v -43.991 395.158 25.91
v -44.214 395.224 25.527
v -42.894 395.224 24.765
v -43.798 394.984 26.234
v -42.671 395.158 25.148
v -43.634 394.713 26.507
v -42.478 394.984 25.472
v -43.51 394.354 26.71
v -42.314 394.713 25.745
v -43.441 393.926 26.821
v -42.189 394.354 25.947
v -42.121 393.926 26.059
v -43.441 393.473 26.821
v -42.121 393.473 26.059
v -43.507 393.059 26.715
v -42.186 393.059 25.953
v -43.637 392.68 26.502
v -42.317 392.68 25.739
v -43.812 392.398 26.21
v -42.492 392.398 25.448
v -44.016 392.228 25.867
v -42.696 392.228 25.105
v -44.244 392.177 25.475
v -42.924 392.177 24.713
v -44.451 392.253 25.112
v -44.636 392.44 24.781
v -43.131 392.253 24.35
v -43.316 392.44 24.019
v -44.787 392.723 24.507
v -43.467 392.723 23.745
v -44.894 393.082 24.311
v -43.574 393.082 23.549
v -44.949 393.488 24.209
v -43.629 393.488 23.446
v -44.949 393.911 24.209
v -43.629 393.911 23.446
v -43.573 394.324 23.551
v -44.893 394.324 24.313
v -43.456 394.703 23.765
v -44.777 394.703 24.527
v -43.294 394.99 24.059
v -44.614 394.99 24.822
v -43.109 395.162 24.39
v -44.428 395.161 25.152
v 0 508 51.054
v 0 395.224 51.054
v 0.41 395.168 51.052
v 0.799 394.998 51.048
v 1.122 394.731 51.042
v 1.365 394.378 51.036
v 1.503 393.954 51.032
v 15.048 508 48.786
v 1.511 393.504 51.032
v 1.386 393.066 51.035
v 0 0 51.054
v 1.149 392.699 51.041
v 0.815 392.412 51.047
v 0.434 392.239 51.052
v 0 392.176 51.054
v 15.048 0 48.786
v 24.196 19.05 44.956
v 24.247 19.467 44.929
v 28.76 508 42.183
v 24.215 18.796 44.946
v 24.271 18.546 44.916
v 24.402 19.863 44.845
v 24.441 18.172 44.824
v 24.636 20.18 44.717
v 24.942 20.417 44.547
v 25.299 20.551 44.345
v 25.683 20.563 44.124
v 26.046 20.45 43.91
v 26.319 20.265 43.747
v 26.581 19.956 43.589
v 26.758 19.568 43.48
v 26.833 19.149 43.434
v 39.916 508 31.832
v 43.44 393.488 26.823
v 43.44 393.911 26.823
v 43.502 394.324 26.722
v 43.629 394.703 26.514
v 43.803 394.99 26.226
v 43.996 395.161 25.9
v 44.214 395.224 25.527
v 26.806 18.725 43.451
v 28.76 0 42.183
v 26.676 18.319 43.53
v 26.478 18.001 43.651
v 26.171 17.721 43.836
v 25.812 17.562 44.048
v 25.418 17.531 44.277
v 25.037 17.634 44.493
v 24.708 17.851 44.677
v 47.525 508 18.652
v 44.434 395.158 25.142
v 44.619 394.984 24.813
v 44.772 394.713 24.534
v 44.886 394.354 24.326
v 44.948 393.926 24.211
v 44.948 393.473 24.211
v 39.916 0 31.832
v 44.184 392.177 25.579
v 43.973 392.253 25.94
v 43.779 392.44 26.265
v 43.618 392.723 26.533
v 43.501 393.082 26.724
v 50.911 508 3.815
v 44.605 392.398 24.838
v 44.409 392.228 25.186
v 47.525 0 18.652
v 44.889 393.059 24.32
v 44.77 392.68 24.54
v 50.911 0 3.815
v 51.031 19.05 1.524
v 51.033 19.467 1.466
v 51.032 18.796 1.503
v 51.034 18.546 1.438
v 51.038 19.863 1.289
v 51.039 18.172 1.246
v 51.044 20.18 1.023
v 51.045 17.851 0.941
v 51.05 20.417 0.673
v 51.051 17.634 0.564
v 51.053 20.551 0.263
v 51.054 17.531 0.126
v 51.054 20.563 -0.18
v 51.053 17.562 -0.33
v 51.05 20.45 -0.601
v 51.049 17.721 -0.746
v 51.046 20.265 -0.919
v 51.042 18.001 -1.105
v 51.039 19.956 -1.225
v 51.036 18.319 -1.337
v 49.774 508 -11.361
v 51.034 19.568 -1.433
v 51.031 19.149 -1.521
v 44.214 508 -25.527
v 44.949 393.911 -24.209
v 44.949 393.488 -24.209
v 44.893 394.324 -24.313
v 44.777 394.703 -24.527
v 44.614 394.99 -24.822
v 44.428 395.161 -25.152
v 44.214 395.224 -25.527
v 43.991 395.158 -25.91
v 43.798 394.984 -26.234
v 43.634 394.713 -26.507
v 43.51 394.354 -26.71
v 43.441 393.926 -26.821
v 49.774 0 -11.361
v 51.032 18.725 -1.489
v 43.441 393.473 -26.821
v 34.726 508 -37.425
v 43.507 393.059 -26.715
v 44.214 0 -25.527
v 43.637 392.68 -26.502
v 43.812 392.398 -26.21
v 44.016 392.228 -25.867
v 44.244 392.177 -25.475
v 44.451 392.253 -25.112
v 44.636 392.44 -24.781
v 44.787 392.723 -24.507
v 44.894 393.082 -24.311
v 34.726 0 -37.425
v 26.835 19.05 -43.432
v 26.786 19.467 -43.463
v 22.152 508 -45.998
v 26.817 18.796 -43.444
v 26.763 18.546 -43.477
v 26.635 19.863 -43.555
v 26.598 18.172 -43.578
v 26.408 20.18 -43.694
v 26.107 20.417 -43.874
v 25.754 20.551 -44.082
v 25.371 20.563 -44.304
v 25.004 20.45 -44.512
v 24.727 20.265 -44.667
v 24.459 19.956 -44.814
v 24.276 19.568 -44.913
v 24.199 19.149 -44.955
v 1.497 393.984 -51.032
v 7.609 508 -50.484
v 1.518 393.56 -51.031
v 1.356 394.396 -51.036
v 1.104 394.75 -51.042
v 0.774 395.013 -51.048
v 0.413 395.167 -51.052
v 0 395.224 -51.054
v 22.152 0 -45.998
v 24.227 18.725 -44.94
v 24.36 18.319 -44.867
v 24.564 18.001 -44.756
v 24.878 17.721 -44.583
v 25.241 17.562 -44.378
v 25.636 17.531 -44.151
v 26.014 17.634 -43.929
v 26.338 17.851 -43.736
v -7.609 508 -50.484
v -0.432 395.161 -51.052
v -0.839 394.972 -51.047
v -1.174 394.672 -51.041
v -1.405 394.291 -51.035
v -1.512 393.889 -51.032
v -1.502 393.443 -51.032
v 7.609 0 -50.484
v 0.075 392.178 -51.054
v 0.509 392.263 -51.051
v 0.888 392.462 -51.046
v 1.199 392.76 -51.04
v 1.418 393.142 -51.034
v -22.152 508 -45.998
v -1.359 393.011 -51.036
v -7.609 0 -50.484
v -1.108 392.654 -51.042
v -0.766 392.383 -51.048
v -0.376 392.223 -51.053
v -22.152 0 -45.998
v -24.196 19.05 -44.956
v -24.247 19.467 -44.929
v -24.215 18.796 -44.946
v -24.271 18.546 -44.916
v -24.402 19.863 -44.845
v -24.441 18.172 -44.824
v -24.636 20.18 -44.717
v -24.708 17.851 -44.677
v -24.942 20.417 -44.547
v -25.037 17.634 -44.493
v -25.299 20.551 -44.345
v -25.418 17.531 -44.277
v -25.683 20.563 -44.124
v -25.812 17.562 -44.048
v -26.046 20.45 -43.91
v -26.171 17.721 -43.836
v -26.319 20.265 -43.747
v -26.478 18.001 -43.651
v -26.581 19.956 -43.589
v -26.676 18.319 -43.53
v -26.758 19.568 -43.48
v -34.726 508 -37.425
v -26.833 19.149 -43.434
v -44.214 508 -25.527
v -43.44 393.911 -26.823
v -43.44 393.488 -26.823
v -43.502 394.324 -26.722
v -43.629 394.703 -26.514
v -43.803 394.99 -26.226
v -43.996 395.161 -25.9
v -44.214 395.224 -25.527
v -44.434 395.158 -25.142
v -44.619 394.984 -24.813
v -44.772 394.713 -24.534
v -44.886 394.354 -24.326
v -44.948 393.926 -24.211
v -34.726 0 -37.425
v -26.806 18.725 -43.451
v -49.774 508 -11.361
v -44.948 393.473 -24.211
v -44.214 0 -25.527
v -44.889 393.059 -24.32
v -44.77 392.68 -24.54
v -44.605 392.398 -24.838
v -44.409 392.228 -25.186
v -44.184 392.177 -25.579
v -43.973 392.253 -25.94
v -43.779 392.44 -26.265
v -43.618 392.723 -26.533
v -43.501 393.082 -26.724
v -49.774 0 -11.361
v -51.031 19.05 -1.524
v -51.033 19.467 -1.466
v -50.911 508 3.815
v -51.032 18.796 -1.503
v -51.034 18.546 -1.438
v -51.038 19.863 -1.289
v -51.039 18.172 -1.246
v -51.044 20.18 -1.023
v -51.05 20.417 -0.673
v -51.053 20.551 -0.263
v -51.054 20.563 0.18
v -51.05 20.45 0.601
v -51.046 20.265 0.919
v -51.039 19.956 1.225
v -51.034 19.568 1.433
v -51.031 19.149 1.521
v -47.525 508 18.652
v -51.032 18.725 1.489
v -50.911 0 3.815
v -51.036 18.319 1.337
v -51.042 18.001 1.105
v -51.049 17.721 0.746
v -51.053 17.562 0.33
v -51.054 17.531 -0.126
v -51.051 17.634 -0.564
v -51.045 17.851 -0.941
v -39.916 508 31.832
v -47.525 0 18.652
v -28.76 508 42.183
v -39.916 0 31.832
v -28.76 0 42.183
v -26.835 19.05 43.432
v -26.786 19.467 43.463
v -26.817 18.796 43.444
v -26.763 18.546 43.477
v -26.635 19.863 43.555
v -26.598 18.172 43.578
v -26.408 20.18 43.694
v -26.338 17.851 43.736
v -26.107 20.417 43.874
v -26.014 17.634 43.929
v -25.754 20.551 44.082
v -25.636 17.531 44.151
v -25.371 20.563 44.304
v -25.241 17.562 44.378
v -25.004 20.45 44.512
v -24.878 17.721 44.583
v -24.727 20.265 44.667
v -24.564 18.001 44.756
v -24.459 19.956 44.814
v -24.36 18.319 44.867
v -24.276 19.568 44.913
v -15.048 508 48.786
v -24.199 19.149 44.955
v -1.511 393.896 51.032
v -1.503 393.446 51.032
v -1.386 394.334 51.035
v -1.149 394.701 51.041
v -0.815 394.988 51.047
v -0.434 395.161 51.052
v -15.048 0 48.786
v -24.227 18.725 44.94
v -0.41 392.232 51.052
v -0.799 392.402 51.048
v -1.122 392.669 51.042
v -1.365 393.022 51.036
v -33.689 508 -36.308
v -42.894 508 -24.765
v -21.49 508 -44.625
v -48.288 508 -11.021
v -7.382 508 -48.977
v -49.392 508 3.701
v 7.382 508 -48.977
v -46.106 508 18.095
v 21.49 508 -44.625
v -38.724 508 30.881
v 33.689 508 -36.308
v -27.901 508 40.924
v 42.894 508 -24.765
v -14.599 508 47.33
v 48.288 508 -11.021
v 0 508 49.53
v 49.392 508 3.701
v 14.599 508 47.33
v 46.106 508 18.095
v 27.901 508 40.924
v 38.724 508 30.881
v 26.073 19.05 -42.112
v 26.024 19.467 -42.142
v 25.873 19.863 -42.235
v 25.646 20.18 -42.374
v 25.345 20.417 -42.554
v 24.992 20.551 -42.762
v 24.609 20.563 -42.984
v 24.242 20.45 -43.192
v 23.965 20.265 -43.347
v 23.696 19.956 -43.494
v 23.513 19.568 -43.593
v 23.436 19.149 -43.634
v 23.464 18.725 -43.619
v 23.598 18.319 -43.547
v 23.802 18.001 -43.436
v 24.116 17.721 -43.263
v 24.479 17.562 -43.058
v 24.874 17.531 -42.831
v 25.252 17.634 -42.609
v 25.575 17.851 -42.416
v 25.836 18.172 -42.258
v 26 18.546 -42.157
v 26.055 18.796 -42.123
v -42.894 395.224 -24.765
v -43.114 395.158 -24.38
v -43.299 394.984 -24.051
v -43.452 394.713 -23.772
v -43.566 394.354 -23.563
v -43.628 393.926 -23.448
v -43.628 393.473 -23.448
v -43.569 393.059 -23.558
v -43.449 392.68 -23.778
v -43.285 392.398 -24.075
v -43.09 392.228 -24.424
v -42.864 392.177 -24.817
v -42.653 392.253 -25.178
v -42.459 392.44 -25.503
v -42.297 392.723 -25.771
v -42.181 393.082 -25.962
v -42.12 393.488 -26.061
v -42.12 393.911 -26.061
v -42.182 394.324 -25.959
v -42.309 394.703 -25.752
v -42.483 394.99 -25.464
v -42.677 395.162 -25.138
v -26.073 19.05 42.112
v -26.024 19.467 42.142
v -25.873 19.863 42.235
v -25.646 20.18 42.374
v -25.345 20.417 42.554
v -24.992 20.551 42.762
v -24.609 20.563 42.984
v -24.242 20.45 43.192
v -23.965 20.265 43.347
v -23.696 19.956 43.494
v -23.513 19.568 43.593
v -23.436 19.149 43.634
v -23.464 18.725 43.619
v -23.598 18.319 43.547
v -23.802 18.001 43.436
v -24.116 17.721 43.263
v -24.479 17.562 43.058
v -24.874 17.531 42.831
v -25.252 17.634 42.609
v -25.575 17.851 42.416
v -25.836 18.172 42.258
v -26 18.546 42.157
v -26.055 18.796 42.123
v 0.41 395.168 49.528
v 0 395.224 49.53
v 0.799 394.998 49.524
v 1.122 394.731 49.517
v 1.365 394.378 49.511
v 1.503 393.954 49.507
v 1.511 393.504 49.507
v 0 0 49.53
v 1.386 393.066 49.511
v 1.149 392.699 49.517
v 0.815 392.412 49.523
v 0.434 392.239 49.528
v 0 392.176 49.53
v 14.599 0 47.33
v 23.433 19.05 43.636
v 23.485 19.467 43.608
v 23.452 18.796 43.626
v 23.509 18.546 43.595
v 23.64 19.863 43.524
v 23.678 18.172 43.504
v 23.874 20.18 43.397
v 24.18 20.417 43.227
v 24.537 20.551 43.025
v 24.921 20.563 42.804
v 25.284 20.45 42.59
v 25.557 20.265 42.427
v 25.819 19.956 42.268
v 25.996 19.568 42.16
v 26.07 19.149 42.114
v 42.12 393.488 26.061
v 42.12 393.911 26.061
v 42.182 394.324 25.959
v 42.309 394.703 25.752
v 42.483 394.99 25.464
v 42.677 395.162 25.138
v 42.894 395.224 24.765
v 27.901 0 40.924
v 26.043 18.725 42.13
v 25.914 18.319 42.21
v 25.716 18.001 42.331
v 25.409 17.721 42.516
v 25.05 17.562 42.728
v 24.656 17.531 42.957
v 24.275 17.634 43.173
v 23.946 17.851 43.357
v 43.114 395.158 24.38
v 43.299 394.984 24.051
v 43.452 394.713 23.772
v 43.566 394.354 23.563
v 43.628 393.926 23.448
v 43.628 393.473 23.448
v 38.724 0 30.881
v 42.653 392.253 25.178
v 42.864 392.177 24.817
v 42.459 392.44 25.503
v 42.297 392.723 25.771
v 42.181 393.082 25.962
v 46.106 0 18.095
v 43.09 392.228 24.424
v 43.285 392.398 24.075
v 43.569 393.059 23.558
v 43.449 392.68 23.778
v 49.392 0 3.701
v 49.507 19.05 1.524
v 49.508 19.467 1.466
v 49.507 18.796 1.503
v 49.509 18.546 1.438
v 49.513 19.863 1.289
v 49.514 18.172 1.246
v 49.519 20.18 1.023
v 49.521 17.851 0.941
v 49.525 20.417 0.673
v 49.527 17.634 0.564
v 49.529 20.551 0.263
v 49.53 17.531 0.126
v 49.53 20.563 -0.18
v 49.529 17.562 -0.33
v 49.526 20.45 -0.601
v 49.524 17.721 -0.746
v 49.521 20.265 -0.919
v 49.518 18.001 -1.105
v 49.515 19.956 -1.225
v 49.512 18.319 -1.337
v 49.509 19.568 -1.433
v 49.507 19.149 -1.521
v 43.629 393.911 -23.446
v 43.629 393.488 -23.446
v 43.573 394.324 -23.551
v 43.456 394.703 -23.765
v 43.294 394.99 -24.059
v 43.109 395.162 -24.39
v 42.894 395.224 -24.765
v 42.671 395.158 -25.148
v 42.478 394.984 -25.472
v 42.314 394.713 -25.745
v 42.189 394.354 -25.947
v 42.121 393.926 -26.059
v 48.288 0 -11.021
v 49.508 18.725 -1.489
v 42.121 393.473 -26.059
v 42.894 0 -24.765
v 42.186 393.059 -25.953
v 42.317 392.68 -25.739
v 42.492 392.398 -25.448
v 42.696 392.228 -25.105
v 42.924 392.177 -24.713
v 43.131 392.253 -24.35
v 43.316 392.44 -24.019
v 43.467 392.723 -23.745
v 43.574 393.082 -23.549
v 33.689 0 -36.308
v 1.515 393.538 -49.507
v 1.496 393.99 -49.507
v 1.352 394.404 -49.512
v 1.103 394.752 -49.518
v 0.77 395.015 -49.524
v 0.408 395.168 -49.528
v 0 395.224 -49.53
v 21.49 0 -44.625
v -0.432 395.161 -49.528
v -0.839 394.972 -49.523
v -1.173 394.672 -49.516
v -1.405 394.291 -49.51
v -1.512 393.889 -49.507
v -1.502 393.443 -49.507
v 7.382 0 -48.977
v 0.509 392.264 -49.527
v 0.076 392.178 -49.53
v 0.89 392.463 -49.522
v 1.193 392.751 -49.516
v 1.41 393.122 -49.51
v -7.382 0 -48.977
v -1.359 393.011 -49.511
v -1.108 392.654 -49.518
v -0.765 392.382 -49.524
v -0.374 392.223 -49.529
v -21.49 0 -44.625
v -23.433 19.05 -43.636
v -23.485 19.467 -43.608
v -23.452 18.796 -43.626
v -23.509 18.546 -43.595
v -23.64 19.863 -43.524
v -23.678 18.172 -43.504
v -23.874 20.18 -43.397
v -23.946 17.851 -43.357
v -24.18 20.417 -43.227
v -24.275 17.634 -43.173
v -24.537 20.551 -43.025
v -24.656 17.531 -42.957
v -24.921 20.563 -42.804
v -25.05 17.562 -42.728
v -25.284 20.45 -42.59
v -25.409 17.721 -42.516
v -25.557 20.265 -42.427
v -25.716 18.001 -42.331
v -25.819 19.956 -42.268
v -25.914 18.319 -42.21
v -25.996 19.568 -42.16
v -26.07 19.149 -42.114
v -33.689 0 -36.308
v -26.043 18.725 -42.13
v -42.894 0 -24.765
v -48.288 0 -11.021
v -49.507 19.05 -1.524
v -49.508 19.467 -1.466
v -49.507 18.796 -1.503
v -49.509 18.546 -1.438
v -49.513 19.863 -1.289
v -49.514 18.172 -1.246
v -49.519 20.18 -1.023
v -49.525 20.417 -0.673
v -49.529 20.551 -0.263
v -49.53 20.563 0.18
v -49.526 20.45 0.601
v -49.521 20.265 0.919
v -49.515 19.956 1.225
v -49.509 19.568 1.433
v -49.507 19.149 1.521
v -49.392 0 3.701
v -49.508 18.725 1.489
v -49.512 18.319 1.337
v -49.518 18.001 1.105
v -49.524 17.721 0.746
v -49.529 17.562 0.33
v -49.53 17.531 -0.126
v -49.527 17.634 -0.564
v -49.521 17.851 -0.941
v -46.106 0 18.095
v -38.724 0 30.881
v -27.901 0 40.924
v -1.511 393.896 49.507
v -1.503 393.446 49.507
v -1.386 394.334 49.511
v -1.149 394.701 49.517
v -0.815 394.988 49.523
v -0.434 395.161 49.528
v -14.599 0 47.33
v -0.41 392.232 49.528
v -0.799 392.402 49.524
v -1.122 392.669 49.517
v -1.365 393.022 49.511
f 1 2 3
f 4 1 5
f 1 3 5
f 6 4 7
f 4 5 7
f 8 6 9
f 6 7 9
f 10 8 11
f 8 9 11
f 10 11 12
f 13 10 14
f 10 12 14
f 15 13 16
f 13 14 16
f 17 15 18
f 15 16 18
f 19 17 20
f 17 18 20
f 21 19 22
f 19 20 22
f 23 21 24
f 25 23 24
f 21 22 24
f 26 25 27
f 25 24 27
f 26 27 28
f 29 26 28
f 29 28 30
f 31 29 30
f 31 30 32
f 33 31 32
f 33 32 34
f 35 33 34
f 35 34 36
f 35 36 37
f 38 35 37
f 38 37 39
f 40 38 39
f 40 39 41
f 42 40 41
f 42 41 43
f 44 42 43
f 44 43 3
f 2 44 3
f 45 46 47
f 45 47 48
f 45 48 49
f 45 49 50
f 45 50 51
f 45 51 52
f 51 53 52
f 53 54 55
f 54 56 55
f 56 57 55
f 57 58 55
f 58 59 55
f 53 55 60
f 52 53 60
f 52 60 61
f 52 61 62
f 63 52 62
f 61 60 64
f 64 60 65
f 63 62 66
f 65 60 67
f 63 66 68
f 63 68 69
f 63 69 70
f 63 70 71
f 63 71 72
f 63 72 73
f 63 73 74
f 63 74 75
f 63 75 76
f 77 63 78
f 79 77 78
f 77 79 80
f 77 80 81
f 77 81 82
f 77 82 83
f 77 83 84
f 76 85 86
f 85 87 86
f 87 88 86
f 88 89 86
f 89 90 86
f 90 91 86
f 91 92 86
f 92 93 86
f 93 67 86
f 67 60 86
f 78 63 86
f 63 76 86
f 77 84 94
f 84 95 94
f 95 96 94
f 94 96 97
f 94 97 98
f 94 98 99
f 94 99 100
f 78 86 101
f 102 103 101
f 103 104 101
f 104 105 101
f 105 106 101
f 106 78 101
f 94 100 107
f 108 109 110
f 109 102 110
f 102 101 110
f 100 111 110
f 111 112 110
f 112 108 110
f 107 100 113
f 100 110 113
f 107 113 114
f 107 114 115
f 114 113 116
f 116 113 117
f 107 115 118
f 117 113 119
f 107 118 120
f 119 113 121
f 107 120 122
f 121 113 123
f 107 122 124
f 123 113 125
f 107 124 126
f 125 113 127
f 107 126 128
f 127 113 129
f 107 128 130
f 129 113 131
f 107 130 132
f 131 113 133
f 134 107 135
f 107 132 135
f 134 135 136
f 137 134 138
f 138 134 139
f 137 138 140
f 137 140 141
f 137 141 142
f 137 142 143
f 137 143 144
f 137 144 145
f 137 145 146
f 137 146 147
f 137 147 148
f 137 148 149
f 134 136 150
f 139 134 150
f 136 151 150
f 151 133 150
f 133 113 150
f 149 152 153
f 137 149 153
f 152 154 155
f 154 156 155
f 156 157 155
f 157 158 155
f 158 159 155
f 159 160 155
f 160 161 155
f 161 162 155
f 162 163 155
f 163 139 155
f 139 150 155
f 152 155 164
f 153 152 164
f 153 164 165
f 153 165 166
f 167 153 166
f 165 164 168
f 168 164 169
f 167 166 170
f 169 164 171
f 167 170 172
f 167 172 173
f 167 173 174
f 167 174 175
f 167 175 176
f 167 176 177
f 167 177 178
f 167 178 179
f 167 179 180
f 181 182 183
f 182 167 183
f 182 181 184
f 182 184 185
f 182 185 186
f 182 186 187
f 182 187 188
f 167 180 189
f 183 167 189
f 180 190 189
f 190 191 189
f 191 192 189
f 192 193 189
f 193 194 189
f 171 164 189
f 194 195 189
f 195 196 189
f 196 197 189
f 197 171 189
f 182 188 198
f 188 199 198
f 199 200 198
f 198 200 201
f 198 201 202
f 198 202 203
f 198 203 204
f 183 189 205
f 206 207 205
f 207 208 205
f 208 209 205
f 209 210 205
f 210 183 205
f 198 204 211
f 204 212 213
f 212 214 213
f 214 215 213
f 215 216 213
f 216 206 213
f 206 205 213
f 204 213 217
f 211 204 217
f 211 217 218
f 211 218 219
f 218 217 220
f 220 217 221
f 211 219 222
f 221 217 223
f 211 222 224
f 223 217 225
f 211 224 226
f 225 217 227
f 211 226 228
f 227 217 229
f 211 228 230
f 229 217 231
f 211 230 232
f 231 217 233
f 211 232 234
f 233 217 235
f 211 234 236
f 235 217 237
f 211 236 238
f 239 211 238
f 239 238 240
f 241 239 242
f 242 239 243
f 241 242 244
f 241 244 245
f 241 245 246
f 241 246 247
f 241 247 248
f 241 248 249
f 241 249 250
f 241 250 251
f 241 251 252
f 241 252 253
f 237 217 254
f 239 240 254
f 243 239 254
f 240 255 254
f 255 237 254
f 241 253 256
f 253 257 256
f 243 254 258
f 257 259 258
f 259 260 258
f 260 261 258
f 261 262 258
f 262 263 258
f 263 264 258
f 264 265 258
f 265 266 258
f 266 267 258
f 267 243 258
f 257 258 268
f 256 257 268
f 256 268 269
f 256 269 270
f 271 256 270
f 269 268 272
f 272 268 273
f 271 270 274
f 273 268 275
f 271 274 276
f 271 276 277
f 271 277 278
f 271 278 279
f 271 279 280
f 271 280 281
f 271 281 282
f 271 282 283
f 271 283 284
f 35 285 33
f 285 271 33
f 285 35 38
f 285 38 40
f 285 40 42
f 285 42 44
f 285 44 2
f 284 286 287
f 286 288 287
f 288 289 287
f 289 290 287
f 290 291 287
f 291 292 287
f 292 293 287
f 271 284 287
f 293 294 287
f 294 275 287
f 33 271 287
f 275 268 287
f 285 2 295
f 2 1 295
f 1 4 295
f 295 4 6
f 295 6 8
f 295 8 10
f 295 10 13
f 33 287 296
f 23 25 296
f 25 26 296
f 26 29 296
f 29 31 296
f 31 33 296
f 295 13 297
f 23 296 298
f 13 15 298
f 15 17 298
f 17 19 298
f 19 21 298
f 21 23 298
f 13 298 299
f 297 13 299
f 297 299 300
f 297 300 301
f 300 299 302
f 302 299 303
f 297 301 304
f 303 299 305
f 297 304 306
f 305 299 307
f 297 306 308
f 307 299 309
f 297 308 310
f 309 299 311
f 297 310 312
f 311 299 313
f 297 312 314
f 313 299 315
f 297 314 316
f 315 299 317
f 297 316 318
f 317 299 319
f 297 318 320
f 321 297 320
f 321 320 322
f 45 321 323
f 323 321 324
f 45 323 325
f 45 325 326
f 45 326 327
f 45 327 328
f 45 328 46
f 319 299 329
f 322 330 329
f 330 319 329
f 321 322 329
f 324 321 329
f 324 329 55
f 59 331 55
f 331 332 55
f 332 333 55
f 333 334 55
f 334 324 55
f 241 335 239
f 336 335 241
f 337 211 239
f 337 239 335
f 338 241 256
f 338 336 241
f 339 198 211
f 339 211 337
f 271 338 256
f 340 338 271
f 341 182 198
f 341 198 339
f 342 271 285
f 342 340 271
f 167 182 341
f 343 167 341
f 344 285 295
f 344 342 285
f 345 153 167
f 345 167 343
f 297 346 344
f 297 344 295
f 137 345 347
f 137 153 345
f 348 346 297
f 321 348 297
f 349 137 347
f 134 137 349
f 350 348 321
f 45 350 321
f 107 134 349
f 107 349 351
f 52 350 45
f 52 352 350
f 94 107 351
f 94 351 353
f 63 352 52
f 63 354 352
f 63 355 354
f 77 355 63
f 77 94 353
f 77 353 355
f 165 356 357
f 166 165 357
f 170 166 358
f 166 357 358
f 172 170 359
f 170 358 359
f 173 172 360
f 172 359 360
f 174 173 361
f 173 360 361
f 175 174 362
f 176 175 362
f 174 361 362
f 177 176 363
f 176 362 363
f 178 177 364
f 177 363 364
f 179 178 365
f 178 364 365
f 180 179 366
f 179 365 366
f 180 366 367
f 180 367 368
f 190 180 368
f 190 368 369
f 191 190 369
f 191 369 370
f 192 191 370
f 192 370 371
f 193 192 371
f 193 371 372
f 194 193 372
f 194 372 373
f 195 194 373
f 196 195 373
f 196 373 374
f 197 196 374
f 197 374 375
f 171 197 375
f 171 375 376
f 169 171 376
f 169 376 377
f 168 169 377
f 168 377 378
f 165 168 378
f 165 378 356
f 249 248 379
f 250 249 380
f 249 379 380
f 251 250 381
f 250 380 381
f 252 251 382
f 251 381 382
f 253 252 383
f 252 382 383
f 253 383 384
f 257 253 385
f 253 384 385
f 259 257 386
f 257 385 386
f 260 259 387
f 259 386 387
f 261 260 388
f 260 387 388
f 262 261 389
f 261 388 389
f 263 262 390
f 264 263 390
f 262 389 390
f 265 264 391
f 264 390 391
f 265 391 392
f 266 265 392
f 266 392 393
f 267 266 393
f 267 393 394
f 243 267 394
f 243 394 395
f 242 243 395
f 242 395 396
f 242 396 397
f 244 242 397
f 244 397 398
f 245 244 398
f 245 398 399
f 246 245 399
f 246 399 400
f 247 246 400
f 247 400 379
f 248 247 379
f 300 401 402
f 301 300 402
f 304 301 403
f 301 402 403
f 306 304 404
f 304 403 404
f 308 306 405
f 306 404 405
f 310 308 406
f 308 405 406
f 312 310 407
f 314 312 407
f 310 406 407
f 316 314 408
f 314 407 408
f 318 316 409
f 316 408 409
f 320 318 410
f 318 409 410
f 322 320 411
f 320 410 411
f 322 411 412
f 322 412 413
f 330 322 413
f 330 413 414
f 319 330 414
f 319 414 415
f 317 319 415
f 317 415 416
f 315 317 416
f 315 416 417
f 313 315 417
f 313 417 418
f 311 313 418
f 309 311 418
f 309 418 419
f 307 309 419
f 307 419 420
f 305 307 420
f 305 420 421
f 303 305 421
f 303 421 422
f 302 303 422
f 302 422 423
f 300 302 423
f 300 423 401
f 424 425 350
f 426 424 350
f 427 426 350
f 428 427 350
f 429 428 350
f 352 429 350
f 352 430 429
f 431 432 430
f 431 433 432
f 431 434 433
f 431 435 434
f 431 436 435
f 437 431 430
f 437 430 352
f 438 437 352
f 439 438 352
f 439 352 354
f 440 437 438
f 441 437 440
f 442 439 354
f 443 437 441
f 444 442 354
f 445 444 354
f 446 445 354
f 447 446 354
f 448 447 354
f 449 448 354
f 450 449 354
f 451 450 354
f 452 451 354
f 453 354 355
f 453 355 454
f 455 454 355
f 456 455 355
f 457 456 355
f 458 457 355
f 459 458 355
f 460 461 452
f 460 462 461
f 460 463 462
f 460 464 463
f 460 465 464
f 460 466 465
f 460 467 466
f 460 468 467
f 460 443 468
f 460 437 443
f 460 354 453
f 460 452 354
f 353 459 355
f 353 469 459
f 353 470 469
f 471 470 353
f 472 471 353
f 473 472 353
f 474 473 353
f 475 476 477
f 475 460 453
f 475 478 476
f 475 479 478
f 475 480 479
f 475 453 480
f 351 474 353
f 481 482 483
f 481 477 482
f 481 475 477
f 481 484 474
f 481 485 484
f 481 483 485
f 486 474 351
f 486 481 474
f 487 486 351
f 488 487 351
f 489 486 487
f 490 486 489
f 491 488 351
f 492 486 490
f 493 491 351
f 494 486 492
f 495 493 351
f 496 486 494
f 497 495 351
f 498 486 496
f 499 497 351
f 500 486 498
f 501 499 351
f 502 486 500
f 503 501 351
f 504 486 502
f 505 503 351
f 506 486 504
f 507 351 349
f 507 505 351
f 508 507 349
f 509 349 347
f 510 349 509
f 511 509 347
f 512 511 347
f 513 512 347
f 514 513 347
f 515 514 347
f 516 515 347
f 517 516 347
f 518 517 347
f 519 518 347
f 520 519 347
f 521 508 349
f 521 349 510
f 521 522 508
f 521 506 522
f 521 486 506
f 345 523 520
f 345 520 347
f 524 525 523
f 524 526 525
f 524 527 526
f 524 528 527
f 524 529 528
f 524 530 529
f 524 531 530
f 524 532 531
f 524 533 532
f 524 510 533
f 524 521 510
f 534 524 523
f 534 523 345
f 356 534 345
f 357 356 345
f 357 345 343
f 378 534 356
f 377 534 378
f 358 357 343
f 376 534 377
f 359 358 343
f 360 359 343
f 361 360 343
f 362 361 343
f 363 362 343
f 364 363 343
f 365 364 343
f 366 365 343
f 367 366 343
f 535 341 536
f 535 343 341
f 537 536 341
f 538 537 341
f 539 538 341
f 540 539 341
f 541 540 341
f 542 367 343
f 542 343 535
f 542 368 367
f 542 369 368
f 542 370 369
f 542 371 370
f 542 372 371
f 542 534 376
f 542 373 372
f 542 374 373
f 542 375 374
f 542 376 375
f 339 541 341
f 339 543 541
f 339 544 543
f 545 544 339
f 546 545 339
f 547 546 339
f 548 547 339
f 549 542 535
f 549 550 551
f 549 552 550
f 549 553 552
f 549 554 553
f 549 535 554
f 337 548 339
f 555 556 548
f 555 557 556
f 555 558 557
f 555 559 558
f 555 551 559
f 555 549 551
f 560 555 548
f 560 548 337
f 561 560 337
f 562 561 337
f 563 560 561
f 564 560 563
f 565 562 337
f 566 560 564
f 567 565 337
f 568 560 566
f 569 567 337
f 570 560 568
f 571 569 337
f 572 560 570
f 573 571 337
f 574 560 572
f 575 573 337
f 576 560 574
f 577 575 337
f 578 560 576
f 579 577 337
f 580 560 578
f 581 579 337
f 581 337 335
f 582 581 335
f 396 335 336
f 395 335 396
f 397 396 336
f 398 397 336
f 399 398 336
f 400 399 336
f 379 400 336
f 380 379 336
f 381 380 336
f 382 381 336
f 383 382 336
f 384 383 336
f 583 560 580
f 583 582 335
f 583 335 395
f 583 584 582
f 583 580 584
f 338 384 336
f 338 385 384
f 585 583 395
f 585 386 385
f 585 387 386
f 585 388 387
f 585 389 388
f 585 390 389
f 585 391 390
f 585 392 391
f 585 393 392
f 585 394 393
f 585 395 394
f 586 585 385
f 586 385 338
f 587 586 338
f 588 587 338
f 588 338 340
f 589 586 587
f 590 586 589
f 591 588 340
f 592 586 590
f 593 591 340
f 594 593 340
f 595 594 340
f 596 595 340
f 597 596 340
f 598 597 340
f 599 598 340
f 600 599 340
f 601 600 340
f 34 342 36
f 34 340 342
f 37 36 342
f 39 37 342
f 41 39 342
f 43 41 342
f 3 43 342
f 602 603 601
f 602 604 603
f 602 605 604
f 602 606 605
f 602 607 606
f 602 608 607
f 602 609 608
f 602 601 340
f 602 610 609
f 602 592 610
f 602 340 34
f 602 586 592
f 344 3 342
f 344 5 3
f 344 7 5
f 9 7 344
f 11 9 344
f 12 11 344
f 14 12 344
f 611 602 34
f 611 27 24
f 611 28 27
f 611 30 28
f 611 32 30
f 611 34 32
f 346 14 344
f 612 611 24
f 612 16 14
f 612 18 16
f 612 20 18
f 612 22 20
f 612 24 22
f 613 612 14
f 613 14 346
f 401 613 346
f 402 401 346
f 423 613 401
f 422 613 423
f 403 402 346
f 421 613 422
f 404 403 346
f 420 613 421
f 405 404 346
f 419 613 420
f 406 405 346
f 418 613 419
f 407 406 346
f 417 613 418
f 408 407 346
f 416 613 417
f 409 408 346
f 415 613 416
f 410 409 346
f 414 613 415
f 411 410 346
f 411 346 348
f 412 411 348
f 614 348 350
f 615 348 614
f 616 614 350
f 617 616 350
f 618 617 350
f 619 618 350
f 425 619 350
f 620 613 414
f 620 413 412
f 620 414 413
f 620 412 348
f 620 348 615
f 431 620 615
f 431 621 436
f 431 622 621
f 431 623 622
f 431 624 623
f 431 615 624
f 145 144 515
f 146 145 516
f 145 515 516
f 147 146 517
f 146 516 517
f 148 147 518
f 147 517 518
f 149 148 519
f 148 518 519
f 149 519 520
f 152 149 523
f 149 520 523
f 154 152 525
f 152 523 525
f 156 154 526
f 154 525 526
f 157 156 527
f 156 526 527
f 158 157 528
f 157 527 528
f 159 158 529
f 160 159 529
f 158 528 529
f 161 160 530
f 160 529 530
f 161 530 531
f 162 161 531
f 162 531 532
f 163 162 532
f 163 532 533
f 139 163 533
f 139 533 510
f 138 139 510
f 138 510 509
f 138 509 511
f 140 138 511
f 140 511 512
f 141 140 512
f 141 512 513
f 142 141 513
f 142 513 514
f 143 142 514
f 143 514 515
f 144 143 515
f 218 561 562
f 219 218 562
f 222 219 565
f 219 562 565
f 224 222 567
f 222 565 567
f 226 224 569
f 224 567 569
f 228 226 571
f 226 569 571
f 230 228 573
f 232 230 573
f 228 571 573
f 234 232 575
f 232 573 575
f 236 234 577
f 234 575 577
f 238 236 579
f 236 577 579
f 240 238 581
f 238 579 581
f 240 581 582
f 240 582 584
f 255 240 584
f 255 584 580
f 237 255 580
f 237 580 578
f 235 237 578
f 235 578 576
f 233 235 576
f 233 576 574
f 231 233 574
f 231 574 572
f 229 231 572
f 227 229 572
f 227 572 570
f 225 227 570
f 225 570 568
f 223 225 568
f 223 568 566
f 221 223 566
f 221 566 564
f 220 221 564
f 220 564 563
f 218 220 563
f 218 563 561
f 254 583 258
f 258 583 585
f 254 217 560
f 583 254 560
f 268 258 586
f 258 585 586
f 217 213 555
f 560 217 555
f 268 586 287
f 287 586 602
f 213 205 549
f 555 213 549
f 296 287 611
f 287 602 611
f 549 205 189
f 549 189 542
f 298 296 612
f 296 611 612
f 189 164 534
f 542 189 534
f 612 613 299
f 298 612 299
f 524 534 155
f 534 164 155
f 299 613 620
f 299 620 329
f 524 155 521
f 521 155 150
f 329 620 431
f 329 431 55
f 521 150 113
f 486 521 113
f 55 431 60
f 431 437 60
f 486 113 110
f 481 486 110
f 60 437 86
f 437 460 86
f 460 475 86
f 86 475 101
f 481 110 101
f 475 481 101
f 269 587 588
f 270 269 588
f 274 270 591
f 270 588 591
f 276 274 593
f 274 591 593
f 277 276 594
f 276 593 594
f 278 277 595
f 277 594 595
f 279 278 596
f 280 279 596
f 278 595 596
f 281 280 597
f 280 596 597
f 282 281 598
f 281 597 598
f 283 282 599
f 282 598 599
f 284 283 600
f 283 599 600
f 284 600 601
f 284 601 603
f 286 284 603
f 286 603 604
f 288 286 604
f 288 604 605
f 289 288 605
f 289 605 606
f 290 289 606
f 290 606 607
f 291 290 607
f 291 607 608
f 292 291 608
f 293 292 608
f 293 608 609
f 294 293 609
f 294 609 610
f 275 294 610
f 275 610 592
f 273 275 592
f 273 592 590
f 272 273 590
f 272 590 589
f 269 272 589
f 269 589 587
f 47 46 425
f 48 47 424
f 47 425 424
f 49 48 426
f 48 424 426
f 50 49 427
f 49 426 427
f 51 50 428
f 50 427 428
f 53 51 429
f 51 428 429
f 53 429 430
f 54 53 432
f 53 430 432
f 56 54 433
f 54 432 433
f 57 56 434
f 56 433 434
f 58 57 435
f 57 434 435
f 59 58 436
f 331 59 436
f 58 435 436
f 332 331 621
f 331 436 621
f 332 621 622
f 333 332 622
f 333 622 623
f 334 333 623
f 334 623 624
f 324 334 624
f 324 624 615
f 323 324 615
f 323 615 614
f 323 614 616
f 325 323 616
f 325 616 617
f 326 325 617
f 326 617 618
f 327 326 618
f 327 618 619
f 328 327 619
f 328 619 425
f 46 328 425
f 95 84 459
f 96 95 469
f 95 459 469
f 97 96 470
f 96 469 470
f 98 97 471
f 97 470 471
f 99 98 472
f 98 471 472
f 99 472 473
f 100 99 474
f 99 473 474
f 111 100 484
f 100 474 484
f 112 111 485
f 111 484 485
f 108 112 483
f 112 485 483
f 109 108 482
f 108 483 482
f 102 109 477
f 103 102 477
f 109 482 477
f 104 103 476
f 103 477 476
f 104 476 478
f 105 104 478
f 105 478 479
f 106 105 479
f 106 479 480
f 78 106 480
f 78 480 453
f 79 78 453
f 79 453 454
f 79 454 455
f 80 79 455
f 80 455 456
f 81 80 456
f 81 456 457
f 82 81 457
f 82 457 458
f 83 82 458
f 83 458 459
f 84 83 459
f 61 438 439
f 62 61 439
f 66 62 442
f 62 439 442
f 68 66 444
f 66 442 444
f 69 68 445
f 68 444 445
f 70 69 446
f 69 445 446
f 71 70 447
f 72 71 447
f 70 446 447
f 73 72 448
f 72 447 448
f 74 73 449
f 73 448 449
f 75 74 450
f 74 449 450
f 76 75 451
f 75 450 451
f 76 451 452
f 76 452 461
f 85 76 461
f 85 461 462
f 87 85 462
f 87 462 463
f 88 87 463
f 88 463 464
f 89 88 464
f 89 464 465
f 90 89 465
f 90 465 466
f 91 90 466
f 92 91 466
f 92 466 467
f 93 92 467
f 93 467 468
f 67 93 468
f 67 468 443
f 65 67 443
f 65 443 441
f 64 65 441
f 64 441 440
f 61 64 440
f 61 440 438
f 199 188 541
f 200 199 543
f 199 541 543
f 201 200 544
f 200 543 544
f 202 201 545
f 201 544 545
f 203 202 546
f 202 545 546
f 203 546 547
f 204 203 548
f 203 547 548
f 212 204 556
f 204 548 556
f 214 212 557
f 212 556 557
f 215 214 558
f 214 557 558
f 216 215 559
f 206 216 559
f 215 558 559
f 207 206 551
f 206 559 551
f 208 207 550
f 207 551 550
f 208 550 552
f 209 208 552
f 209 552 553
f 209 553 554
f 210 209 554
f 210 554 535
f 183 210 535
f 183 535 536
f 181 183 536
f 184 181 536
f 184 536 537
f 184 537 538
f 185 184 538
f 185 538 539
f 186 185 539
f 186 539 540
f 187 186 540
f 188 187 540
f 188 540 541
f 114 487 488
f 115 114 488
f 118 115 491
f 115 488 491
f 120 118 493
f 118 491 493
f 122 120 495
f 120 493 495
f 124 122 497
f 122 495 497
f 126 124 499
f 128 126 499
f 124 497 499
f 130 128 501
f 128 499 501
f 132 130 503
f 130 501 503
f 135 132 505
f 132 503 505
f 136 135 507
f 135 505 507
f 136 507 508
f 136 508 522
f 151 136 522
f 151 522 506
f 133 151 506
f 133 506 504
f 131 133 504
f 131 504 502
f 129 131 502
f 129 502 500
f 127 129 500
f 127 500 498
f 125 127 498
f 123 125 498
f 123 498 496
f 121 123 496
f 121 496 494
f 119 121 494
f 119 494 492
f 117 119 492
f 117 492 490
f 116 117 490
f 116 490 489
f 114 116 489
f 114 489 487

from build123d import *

# Parameters (mm, degrees)
SKETCH2_R           = 51.054
SKETCH2_R_2         = 49.53
BOSS_EXTRUDE1_DEPTH = 508
SKETCH3_R           = 1.524
CUT_EXTRUDE1_DEPTH  = 74.422
CIRPATTERN1_COUNT   = 6
SKETCH4_R           = 1.524
CUT_EXTRUDE2_DEPTH  = 74.422
CIRPATTERN2_COUNT   = 6


with BuildPart() as part:
    # Sketch2 → Boss-Extrude1 (new body)
    with BuildSketch(Plane(origin=(0, 0, 0), x_dir=(1, 0, 0), z_dir=(0, 1, 0))):
        with Locations(Location((0, 0, 0), (0, 0, 270))):
            Circle(SKETCH2_R)
        with Locations(Location((0, 0, 0), (0, 0, 270))):
            Circle(SKETCH2_R_2, mode=Mode.SUBTRACT)
    extrude(amount=BOSS_EXTRUDE1_DEPTH)

    # Sketch3 → Cut-Extrude1 (cut)
    with BuildSketch(Plane.XY):
        with Locations(Location((0, 393.7, 0), (0, 0, 90))):
            Circle(SKETCH3_R)
    cut_extrude1 = extrude(amount=-CUT_EXTRUDE1_DEPTH, mode=Mode.SUBTRACT)

    # CirPattern1: Cut-Extrude1 ×6 about axis
    cirpattern1_axis = Axis((0, 508, 0), (0, -1, 0))
    for i in range(1, CIRPATTERN1_COUNT):
        add(cut_extrude1.rotate(cirpattern1_axis, i * 360 / CIRPATTERN1_COUNT), mode=Mode.SUBTRACT)

    # Sketch4 → Cut-Extrude2 (cut)
    with BuildSketch(Plane(origin=(0, 0, 0), x_dir=(0, 0, -1), z_dir=(1, 0, 0))):
        with Locations((0, 19.05)):
            Circle(SKETCH4_R)
    cut_extrude2 = extrude(amount=-CUT_EXTRUDE2_DEPTH, mode=Mode.SUBTRACT)

    # CirPattern2: Cut-Extrude2 ×6 about axis
    cirpattern2_axis = Axis((0, 508, 0), (0, -1, 0))
    for i in range(1, CIRPATTERN2_COUNT):
        add(cut_extrude2.rotate(cirpattern2_axis, i * 360 / CIRPATTERN2_COUNT), mode=Mode.SUBTRACT)


solid = part.part
